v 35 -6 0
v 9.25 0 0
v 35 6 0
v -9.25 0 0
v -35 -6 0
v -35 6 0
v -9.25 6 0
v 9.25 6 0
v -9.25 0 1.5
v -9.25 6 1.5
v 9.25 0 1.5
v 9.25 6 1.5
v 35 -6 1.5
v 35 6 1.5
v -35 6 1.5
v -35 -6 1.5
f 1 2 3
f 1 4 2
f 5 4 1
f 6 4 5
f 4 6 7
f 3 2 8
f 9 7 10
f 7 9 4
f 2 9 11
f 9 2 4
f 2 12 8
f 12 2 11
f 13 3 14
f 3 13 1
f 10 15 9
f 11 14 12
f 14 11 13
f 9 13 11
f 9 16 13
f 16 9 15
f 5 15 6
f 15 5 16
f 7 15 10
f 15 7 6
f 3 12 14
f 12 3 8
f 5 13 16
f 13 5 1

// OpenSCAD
// 10-well comb for agarose gel casting, printed lying flat
// Units: mm. Print orientation: flat on bed, teeth pointing down (-Y).

// ---------- Parameters ----------
spine_len      = 70;    // spine length along X
spine_wid      = 12;    // spine width along Y
plate_thk      = 1.5;   // plate thickness along Z

tooth_count    = 10;    // number of teeth
tooth_w        = 5.0;   // tooth width along X
tooth_l        = 12;    // tooth length along Y (hanging from spine)
tooth_pitch    = 1.5;   // centre-to-centre spacing of teeth along X

eps            = 0.5;   // cutter overshoot past faces
$fn            = 64;

// ---------- Derived ----------
row_span = (tooth_count - 1) * tooth_pitch;  // span of gaps
x0       = -(row_span + tooth_w) / 2;        // X of first tooth

// ---------- Model ----------
difference() {
    // Base plate
    translate([-spine_len / 2, -spine_wid / 2, 0])
        cube([spine_len, spine_wid, plate_thk]);

    // Teeth cut out from the +Y side of the plate
    for (i = [0 : tooth_count - 1])
        translate([x0 + i * tooth_pitch, 0, 0])
            cube([tooth_w, tooth_l + eps, plate_thk + eps]);
}
